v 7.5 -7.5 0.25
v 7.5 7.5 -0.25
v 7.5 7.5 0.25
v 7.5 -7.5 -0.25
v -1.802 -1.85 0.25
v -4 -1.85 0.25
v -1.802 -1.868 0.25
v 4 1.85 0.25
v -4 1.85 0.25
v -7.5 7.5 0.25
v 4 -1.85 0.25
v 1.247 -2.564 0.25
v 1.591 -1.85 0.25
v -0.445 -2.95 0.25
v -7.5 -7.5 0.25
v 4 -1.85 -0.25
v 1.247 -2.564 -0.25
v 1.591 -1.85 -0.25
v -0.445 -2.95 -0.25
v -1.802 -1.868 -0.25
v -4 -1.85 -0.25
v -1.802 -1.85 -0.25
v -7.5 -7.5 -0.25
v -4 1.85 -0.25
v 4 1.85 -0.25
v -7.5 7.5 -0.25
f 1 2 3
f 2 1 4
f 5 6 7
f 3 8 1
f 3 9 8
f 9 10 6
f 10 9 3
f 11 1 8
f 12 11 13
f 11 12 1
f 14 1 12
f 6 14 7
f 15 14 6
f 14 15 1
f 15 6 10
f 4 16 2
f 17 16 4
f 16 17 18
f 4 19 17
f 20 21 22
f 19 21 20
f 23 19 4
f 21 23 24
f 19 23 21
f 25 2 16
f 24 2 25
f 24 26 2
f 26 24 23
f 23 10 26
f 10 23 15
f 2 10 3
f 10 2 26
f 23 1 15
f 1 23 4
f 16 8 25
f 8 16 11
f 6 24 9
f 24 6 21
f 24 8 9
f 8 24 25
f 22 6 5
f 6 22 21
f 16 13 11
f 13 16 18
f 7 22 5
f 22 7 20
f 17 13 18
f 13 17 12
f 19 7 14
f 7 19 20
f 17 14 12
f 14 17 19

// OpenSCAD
difference() {
    cube([15, 15, 0.5], center=true);
    cube([8, 3.7,1], center=true);
    translate([0, -1, -2]){
        cylinder(5, 2, 2);
    }
}
